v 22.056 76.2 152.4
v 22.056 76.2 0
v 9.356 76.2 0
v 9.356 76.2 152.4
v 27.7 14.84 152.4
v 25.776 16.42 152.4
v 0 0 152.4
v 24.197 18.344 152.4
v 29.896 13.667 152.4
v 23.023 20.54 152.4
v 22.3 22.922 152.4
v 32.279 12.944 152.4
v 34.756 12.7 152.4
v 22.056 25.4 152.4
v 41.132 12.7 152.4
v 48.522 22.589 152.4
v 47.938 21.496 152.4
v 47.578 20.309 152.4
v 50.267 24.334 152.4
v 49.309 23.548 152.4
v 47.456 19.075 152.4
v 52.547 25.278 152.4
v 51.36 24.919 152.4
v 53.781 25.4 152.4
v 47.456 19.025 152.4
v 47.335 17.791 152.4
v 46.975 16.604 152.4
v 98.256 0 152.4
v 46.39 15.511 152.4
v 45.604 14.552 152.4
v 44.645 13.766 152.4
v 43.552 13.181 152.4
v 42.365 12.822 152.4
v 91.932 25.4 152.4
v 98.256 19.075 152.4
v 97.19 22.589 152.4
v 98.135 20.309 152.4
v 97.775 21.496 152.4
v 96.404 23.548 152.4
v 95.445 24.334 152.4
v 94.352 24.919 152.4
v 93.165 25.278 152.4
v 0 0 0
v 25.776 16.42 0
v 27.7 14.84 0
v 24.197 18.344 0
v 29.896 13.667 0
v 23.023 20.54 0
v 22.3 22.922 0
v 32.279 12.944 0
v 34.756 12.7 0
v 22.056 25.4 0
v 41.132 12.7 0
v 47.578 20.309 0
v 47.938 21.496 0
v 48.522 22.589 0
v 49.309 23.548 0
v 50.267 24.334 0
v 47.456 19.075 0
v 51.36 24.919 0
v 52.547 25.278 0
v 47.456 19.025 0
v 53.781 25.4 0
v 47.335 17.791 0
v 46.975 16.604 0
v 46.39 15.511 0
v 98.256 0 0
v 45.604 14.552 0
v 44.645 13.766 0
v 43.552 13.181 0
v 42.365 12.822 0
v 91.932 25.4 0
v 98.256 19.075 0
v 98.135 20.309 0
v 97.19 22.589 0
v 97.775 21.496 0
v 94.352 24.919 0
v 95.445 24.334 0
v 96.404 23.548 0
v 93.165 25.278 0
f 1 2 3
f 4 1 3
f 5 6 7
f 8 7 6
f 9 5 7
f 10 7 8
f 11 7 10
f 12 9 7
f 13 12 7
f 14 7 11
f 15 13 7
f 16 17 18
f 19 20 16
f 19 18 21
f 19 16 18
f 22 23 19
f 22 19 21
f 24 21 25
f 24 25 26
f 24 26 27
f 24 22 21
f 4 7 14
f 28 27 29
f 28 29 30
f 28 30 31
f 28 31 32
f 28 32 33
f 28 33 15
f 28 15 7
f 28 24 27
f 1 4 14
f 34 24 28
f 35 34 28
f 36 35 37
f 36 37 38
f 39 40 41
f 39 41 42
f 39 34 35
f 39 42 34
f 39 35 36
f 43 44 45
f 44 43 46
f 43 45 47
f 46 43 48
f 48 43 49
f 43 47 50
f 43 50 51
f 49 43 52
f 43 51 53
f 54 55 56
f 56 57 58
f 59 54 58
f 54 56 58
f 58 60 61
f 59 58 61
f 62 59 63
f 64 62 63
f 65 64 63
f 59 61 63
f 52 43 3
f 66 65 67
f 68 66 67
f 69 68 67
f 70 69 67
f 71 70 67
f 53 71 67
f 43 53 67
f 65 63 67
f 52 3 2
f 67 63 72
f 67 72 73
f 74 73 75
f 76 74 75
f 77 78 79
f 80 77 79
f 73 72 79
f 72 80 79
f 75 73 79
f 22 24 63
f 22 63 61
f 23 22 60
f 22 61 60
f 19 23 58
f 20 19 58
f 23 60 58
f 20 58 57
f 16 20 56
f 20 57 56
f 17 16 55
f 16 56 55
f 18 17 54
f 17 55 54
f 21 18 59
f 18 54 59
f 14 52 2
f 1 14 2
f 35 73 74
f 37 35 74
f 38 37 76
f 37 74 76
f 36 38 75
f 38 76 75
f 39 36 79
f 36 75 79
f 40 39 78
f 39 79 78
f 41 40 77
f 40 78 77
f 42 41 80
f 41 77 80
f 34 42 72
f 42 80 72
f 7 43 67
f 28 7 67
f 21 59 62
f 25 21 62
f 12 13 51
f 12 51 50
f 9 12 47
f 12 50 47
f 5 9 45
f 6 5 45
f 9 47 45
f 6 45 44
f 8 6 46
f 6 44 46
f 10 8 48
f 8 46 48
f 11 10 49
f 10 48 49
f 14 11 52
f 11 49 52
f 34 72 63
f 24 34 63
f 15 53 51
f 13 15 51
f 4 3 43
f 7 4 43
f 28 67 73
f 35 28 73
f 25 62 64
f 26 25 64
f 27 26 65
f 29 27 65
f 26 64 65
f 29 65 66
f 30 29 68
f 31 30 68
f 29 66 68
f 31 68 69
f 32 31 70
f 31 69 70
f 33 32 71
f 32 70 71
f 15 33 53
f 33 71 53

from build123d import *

# Parameters (mm, degrees)
BOSS_EXTRUDE1_DEPTH = 152.4


with BuildPart() as part:
    # Sketch1 → Boss-Extrude1 (new body)
    with BuildSketch(Plane.XY):
        with BuildLine():
            Line((0, 0), (98.256183541, 0))
            Line((98.256183541, 0), (98.256183541, 12.7))
            Line((98.256183541, 12.7), (98.256183541, 19.0754))
            ThreePointArc((98.256183541, 19.0754), (96.403751089, 23.547567548), (91.931583541, 25.4))
            Line((91.931583541, 25.4), (53.780783541, 25.4))
            ThreePointArc((53.780783541, 25.4), (49.308615993, 23.547567548), (47.456183541, 19.0754))
            Line((47.456183541, 19.0754), (47.456183541, 19.0246))
            ThreePointArc((47.456183541, 19.0246), (45.603751089, 14.552432452), (41.131583541, 12.7))
            Line((41.131583541, 12.7), (34.756183541, 12.7))
            ThreePointArc((34.756183541, 12.7), (25.77592742, 16.419743879), (22.056183541, 25.4))
            Line((22.056183541, 25.4), (22.056183541, 76.2))
            Line((22.056183541, 76.2), (9.356183541, 76.2))
            Line((9.356183541, 76.2), (0, 0))
        make_face()
    extrude(amount=BOSS_EXTRUDE1_DEPTH)


solid = part.part
